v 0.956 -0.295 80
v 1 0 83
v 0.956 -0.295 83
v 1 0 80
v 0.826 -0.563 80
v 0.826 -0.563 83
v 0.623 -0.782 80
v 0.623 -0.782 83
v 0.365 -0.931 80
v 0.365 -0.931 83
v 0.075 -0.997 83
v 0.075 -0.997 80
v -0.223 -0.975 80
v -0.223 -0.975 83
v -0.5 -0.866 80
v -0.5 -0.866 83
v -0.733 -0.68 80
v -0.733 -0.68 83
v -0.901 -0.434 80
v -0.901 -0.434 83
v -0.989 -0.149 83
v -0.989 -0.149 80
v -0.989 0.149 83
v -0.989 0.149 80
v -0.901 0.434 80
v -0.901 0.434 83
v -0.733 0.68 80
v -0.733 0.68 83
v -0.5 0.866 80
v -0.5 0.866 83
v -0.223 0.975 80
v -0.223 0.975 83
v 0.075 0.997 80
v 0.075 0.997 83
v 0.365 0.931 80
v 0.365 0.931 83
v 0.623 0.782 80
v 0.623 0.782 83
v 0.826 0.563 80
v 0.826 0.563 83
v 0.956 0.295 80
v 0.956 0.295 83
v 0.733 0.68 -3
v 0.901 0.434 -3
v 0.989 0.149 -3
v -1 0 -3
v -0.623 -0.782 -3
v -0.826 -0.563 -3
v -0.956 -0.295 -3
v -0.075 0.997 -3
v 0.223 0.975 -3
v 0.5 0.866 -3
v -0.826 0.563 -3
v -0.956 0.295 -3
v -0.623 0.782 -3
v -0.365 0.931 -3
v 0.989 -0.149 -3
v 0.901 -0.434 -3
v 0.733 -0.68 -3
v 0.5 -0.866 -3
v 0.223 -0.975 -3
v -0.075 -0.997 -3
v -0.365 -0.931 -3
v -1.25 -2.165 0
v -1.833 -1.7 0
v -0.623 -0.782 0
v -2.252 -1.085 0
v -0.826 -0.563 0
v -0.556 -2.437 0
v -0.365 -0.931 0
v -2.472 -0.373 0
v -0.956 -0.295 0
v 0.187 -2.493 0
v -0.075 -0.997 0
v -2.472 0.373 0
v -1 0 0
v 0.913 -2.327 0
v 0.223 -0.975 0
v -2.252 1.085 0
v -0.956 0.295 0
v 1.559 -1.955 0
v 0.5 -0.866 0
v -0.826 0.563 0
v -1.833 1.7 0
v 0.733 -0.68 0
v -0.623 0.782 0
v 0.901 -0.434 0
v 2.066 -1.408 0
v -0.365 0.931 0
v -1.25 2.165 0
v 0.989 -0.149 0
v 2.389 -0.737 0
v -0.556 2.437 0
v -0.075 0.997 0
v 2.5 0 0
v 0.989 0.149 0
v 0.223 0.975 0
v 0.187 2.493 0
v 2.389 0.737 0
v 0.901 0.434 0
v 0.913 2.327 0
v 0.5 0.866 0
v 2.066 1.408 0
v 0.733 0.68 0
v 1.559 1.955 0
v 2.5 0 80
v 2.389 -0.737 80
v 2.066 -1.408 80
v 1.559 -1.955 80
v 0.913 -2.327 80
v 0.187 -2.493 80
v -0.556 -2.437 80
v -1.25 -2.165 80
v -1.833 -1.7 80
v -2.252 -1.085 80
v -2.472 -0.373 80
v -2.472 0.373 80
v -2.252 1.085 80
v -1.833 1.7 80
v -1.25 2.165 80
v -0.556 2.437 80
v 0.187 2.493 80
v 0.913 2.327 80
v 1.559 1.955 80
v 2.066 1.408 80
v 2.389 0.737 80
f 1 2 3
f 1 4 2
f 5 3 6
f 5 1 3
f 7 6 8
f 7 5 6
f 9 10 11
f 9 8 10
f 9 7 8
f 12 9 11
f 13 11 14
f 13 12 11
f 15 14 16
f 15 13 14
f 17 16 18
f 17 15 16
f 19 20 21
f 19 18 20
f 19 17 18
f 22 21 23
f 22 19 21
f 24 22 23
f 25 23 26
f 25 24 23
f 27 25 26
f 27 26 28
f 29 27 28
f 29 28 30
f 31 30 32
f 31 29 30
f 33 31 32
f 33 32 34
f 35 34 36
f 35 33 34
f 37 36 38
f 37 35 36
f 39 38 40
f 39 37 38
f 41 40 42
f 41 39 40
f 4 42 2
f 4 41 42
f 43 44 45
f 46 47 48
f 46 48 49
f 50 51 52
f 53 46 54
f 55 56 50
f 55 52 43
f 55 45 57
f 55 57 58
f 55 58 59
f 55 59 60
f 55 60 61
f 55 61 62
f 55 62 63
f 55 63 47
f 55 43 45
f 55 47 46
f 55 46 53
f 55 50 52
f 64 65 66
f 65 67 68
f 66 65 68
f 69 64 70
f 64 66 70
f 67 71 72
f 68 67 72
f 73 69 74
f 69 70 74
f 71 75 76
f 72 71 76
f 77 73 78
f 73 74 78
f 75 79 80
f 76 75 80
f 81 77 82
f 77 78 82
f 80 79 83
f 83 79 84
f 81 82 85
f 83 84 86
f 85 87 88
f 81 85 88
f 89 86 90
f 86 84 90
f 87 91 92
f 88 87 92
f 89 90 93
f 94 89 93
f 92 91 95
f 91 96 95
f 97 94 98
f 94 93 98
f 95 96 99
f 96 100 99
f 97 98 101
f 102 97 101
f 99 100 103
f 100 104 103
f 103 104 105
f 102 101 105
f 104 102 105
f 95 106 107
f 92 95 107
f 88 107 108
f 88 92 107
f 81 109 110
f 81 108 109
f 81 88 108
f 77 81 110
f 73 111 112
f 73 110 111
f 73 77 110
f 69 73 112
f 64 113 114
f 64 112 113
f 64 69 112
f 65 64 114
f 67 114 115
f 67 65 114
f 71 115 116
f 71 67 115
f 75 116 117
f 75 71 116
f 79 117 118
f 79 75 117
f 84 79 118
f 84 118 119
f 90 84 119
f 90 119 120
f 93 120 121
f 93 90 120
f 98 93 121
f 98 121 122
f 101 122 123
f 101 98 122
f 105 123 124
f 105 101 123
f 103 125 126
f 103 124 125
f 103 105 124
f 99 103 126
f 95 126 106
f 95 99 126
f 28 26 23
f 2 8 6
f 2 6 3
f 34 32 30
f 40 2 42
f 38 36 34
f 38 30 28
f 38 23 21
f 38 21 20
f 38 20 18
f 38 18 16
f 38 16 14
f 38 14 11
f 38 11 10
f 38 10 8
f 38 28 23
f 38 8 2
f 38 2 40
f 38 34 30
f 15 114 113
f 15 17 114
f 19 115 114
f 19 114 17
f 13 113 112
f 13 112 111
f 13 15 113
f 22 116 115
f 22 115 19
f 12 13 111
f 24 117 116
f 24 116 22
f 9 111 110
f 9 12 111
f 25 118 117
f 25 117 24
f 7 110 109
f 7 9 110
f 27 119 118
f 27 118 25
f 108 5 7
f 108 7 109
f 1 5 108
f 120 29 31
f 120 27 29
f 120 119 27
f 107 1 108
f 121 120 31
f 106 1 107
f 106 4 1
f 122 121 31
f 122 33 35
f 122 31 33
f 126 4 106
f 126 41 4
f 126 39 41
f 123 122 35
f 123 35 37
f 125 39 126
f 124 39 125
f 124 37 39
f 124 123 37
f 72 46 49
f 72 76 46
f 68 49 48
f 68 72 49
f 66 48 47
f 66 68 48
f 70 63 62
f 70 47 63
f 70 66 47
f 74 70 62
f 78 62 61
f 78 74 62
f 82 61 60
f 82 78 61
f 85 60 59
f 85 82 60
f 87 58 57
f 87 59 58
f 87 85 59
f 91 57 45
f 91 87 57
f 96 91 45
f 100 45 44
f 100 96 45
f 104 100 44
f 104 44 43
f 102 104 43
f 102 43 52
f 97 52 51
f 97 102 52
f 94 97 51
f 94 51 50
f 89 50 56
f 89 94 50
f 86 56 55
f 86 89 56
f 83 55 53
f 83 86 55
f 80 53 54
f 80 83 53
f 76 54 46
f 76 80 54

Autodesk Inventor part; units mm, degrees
ref_plane "YZ Plane" through (0, 0, 0) normal (1, 0, 0) x (0, 1, 0)
ref_plane "XZ Plane" through (0, 0, 0) normal (0, 1, 0) x (-1, 0, 0)
ref_plane "XY Plane" through (0, 0, 0) normal (0, 0, 1) x (1, 0, 0)
sketch "Sketch1" plane through (0, 0, 0) normal (0, 0, 1) x (1, 0, 0)
  circle A0 centre (0, 0) radius 2.5
  dimension "d0" = 5
extrude "Extrusion1" add sketch "Sketch1" along normal blind 80
sketch "Sketch2" plane through (0, 0, 80) normal (0, 0, 1) x (1, 0, 0)
  circle A0 centre (0, 0) radius 2.5 projected
  circle A1 centre (0, 0) radius 1
  dimension "d3" = 2
extrude "Extrusion2" add sketch "Sketch2" along normal blind 3 contours A1
sketch "Sketch3" plane through (0, 0, 0) normal (0, 0, -1) x (-1, 0, 0)
  circle A0 centre (0, 0) radius 1
  dimension "d6" = 2
extrude "Extrusion3" add sketch "Sketch3" along normal blind 3
properties part number "Bone-8cm"
